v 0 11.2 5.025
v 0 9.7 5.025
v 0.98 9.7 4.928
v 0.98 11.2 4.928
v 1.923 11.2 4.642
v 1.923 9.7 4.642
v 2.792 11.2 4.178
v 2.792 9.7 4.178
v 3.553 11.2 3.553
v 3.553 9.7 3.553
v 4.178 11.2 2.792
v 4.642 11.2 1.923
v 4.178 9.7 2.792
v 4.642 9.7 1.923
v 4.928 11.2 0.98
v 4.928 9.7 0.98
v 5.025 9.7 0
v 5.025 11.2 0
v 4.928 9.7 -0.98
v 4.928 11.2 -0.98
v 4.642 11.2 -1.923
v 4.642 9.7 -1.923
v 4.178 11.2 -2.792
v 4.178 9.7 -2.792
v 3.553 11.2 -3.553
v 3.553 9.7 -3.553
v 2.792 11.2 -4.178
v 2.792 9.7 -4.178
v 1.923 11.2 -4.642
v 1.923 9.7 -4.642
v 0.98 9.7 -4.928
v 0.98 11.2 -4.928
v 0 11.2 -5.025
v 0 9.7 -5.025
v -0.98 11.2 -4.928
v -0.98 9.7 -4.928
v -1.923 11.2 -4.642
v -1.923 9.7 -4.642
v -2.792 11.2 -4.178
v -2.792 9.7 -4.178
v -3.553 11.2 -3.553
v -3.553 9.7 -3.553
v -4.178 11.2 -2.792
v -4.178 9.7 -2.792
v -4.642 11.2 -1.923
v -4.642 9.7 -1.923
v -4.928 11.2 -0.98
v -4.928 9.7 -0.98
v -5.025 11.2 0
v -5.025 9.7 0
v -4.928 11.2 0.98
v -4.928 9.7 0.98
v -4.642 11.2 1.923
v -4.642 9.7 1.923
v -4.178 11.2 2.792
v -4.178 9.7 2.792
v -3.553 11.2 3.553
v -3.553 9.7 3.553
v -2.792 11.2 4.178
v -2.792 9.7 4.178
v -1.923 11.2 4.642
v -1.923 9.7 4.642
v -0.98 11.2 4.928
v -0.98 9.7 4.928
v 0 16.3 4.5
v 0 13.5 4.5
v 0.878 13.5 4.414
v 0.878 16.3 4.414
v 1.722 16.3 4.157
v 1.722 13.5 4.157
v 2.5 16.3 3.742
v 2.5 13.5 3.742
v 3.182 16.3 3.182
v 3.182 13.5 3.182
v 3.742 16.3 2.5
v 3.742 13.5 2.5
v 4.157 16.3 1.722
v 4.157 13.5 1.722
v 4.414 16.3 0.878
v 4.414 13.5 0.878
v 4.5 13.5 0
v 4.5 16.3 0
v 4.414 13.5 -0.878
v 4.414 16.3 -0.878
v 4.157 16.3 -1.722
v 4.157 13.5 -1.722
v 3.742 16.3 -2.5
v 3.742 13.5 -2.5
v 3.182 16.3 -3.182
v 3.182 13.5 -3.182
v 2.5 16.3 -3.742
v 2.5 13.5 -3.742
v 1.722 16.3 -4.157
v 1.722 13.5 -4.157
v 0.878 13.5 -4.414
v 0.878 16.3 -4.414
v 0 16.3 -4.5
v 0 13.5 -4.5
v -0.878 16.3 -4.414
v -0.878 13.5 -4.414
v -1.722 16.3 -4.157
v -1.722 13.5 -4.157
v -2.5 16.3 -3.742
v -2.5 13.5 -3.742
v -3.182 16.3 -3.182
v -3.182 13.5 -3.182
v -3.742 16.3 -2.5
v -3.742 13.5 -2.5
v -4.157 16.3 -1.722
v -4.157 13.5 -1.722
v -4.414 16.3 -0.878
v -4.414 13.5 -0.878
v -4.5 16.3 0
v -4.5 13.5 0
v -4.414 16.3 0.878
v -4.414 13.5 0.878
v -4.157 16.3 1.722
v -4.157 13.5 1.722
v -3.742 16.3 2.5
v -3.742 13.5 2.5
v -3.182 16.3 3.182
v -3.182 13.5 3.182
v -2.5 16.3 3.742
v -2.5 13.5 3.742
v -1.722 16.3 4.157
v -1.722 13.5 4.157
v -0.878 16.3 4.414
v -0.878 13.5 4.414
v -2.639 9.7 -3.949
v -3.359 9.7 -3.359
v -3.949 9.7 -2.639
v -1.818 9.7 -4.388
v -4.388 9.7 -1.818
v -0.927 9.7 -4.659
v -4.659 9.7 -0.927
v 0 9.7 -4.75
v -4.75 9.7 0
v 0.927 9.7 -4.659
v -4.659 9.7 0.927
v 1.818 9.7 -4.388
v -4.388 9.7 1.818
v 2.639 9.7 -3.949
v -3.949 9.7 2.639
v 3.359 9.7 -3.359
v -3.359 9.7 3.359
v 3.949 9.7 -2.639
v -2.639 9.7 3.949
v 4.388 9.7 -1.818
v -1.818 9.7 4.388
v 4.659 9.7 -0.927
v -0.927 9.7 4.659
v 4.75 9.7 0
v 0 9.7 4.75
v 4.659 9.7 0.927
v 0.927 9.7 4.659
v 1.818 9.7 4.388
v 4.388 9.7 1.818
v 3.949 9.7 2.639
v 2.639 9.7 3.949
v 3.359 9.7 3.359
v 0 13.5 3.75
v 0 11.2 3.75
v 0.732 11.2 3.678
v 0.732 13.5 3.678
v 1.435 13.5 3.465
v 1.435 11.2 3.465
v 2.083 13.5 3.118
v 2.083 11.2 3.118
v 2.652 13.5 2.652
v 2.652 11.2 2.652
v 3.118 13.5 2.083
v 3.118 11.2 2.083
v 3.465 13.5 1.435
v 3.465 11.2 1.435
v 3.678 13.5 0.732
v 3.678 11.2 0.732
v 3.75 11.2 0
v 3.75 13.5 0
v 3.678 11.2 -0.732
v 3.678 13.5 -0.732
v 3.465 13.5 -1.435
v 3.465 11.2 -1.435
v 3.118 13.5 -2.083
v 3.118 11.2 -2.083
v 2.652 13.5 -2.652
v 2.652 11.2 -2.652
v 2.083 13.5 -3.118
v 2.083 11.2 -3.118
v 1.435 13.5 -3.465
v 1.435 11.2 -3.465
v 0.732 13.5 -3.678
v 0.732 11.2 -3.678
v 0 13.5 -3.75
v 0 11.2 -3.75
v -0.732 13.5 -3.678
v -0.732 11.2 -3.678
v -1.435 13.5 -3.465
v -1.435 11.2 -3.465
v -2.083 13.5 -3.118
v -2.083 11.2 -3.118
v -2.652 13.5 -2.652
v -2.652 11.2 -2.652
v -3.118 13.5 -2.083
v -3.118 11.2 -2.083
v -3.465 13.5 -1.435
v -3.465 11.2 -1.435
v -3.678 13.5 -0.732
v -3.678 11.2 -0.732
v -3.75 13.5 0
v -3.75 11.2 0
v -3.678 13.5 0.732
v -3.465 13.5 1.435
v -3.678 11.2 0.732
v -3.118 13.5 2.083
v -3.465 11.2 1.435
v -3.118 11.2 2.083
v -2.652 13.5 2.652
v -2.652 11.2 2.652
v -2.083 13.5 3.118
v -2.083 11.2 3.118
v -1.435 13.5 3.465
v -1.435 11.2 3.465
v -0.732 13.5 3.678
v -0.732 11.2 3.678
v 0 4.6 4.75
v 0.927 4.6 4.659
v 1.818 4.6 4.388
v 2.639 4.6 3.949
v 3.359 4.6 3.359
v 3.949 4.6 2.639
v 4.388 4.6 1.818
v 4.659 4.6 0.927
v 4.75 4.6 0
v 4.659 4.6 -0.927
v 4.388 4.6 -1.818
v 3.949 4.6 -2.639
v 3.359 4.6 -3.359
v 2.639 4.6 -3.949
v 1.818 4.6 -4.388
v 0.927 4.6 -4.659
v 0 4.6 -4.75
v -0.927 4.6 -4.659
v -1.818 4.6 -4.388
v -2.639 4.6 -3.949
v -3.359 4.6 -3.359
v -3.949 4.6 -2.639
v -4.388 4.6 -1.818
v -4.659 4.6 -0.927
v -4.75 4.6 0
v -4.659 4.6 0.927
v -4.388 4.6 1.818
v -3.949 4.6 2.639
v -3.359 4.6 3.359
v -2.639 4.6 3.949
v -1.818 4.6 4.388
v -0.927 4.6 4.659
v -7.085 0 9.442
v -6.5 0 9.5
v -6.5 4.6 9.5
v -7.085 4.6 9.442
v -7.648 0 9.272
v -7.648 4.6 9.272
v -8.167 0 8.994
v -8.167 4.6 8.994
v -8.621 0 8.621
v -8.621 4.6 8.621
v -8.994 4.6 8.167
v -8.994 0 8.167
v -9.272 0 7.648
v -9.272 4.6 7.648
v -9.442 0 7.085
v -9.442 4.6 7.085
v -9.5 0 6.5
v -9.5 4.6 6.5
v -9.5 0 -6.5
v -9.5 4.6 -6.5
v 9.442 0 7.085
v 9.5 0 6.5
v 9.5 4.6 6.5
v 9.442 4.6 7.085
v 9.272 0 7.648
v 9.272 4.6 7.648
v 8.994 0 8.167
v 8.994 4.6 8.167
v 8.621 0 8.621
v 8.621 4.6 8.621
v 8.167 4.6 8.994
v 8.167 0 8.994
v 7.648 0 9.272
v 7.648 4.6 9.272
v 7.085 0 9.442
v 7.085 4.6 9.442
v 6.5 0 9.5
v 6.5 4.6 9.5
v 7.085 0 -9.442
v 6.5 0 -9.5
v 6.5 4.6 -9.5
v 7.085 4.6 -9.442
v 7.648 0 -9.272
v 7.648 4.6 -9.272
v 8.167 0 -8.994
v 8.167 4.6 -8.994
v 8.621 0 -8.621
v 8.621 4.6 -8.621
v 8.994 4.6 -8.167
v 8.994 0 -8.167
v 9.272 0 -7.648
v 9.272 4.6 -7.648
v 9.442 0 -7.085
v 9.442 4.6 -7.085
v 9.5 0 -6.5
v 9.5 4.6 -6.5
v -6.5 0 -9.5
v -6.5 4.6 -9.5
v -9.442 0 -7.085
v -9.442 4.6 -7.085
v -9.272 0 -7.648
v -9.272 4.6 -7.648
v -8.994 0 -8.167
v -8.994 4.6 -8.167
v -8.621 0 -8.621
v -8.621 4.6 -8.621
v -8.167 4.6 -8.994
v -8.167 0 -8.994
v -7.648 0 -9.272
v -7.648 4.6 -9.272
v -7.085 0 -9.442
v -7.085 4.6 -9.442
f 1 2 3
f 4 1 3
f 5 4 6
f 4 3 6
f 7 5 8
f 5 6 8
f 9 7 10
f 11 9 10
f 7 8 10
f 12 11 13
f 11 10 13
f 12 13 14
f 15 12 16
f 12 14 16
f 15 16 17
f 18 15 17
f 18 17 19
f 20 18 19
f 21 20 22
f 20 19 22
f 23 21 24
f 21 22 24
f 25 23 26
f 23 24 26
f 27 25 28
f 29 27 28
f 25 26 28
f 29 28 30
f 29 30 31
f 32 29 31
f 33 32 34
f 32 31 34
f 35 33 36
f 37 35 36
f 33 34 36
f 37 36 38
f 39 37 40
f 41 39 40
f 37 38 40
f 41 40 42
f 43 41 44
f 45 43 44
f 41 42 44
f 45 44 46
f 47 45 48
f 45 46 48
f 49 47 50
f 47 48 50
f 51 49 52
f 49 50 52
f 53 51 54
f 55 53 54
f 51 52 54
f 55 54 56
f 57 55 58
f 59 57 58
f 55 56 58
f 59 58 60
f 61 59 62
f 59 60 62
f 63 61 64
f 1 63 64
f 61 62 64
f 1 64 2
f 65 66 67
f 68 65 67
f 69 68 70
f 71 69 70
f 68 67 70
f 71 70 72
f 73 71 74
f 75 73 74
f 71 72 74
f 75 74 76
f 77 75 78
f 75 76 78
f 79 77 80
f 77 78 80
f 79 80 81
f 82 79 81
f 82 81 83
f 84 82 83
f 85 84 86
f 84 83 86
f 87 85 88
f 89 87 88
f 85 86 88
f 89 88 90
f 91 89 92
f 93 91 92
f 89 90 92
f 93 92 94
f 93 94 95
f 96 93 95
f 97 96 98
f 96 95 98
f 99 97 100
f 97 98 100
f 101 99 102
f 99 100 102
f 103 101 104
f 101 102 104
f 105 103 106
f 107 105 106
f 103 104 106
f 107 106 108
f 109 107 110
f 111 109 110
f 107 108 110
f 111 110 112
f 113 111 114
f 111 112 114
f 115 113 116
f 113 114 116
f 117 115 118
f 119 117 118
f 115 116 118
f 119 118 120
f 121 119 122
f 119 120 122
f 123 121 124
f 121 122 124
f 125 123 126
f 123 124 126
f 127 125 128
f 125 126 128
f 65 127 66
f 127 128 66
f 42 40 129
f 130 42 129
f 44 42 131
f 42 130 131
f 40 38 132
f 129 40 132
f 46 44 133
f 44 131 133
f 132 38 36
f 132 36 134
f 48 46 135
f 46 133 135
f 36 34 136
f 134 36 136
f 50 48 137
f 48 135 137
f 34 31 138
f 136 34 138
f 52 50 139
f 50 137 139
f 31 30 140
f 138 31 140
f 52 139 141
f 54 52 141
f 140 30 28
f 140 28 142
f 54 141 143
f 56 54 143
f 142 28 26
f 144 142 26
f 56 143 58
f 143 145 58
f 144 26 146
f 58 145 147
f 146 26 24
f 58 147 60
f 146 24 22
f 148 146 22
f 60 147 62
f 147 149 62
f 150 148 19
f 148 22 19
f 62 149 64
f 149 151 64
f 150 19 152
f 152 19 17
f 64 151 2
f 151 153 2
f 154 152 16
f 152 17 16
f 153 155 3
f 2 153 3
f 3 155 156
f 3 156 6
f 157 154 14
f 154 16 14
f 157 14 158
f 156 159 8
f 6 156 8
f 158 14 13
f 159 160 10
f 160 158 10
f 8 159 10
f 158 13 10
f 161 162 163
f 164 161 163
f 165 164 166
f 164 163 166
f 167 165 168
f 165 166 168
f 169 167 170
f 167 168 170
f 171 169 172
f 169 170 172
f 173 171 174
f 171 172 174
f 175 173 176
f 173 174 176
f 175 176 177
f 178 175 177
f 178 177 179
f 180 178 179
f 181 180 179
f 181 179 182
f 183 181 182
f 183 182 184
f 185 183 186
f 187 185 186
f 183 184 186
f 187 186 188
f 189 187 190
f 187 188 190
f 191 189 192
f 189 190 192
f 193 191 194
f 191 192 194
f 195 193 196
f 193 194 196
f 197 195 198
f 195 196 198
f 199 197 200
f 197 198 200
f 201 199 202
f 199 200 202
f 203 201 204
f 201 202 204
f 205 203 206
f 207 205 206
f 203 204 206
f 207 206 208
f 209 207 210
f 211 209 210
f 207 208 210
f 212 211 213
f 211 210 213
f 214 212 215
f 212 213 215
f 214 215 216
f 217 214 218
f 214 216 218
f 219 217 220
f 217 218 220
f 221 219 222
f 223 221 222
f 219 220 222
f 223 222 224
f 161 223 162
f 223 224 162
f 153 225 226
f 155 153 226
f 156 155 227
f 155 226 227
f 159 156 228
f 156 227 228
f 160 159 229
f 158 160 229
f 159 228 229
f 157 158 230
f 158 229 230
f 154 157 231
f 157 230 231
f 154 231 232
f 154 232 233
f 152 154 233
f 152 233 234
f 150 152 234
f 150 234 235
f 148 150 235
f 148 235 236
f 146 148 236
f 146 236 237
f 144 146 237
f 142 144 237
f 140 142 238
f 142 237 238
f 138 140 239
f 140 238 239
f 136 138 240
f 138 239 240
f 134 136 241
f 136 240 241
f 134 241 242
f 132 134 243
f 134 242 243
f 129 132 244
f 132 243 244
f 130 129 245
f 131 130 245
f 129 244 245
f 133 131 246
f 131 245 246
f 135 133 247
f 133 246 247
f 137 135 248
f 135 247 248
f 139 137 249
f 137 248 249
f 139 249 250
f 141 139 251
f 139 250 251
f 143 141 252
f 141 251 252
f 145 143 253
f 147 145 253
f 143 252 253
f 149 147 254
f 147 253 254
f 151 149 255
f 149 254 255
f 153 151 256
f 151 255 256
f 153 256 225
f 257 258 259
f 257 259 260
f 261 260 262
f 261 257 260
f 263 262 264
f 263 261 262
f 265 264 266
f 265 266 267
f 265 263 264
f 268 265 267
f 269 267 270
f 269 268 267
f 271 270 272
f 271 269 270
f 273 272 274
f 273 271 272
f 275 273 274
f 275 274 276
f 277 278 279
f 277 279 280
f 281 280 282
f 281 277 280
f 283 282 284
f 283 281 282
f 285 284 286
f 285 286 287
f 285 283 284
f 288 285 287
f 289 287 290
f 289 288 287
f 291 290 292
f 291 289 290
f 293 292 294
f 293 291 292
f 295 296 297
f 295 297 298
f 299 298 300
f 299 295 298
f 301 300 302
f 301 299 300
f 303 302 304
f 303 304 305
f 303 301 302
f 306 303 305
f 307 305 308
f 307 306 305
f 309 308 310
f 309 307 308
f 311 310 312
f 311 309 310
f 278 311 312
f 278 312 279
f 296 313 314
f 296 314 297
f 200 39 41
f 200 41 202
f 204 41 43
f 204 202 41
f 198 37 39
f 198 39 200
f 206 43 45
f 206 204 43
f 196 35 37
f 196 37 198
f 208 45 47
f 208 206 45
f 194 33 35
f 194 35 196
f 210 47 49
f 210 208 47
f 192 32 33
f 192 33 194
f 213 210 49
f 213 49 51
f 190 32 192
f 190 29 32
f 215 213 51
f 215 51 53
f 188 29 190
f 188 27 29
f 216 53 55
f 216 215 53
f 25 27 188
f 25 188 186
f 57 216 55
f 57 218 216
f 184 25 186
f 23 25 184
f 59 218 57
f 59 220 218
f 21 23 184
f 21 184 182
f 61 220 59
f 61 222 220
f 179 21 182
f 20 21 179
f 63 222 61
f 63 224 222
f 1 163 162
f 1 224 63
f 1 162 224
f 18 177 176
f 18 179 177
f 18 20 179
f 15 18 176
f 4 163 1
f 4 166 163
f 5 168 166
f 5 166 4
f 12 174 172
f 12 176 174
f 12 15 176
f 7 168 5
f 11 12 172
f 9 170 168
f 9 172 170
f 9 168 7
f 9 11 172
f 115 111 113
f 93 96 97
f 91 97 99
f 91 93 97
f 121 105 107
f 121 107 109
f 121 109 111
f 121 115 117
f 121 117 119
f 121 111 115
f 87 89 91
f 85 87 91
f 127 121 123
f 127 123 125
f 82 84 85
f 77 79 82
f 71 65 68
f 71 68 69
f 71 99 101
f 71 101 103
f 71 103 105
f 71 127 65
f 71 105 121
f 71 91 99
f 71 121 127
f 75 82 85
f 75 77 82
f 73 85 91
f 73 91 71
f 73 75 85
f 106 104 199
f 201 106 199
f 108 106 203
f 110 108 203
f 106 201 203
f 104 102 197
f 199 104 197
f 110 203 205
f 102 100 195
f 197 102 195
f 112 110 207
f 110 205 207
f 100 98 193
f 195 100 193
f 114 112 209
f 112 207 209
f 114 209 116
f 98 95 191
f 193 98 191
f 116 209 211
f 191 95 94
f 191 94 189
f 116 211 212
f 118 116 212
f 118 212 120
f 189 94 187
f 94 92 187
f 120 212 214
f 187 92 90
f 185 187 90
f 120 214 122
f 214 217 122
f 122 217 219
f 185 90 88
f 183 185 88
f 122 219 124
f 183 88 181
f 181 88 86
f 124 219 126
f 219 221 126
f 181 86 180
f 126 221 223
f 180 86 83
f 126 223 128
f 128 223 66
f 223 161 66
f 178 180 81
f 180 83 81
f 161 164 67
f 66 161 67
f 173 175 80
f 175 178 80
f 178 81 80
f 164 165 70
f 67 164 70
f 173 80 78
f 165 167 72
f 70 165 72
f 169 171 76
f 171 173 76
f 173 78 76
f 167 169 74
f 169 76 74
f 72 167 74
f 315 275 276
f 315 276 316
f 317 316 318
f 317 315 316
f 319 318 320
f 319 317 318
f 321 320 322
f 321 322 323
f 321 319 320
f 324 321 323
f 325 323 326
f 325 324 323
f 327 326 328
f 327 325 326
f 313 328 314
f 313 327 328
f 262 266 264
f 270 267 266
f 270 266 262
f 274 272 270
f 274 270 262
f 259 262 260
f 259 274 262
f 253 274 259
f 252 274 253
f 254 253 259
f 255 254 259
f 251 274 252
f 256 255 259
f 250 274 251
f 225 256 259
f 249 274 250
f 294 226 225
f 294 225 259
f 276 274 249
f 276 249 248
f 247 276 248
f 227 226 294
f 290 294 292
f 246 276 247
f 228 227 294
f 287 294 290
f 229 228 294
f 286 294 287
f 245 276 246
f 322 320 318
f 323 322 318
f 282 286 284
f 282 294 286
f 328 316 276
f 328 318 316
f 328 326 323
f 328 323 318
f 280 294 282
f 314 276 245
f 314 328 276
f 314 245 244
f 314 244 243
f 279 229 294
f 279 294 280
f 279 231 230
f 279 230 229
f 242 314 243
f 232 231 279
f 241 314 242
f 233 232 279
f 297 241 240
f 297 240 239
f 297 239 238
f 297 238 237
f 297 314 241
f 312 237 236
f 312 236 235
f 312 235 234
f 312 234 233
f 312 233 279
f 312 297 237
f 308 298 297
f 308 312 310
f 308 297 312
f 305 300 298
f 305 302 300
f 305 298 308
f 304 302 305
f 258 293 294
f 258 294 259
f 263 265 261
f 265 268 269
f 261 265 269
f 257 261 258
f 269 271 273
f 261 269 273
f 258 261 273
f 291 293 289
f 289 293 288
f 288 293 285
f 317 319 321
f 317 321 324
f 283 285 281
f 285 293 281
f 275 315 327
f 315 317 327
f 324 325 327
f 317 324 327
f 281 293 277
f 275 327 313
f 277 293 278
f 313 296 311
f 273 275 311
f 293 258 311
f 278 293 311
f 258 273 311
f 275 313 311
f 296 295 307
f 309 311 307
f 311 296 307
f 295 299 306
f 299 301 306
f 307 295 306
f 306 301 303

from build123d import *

# Parameters (mm, degrees)
SALIENTE_EXTRUIR2_DEPTH      = 4.6
SALIENTE_EXTRUIR3_DEPTH      = 5.1
SALIENTE_EXTRUIR3_DEPTH_BACK = 4.6
CROQUIS2_R                   = 4.75
CROQUIS4_R                   = 5.025
SALIENTE_EXTRUIR4_DEPTH      = 1.5
CROQUIS6_R                   = 3.75
SALIENTE_EXTRUIR5_DEPTH      = 2.3
CROQUIS7_R                   = 4.5
SALIENTE_EXTRUIR6_DEPTH      = 2.8


with BuildPart() as part:
    # Croquis1 → Saliente-Extruir2 (new body)
    # profile 1 of 5: a face of its own
    with BuildSketch(Plane(origin=(0, 0, 0), x_dir=(1, 0, 0), z_dir=(0, 1, 0))):
        with BuildLine():
            ThreePointArc((6.5, 9.5), (8.621320344, 8.621320344), (9.5, 6.5))
            Line((9.5, 6.5), (9.5, -6.5))
            ThreePointArc((9.5, -6.5), (8.621320344, -8.621320344), (6.5, -9.5))
            Line((6.5, -9.5), (-6.5, -9.5))
            ThreePointArc((-6.5, -9.5), (-8.621320344, -8.621320344), (-9.5, -6.5))
            Line((-9.5, -6.5), (-9.5, 6.5))
            ThreePointArc((-9.5, 6.5), (-8.621320344, 8.621320344), (-6.5, 9.5))
            Line((-6.5, 9.5), (6.5, 9.5))
        make_face()
        with BuildLine():
            ThreePointArc((4.25, -4.75), (4.603553391, -4.603553391), (4.75, -4.25))
            Line((4.75, -4.25), (4.75, 4.25))
            ThreePointArc((4.75, 4.25), (4.603553391, 4.603553391), (4.25, 4.75))
            Line((4.25, 4.75), (-4.25, 4.75))
            ThreePointArc((-4.25, 4.75), (-4.603553391, 4.603553391), (-4.75, 4.25))
            Line((-4.75, 4.25), (-4.75, -4.25))
            ThreePointArc((-4.75, -4.25), (-4.603553391, -4.603553391), (-4.25, -4.75))
            Line((-4.25, -4.75), (4.25, -4.75))
        make_face(mode=Mode.SUBTRACT)
    # profile 2 of 5: a face of its own
    with BuildSketch(Plane(origin=(0, 0, 0), x_dir=(1, 0, 0), z_dir=(0, 1, 0))):
        with BuildLine():
            ThreePointArc((0, -4.75), (-3.358757211, -3.358757211), (-4.75, 0))
            Line((-4.75, 0), (-4.75, -4.25))
            ThreePointArc((-4.75, -4.25), (-4.603553391, -4.603553391), (-4.25, -4.75))
            Line((-4.25, -4.75), (0, -4.75))
        make_face()
    # profile 3 of 5: a face of its own
    with BuildSketch(Plane(origin=(0, 0, 0), x_dir=(1, 0, 0), z_dir=(0, 1, 0))):
        with BuildLine():
            Line((4.75, -4.25), (4.75, 0))
            ThreePointArc((4.75, 0), (3.358757211, -3.358757211), (0, -4.75))
            Line((0, -4.75), (4.25, -4.75))
            ThreePointArc((4.25, -4.75), (4.603553391, -4.603553391), (4.75, -4.25))
        make_face()
    # profile 4 of 5: a face of its own
    with BuildSketch(Plane(origin=(0, 0, 0), x_dir=(1, 0, 0), z_dir=(0, 1, 0))):
        with BuildLine():
            Line((4.25, 4.75), (0, 4.75))
            ThreePointArc((0, 4.75), (3.358757211, 3.358757211), (4.75, 0))
            Line((4.75, 0), (4.75, 4.25))
            ThreePointArc((4.75, 4.25), (4.603553391, 4.603553391), (4.25, 4.75))
        make_face()
    # profile 5 of 5: a face of its own
    with BuildSketch(Plane(origin=(0, 0, 0), x_dir=(1, 0, 0), z_dir=(0, 1, 0))):
        with BuildLine():
            Line((0, 4.75), (-4.25, 4.75))
            ThreePointArc((-4.25, 4.75), (-4.603553391, 4.603553391), (-4.75, 4.25))
            Line((-4.75, 4.25), (-4.75, 0))
            ThreePointArc((-4.75, 0), (-3.358757211, 3.358757211), (0, 4.75))
        make_face()
    extrude(amount=SALIENTE_EXTRUIR2_DEPTH)

    # Croquis2 → Saliente-Extruir3 (add, two sides: drawn at the far end of the back side and taken through both)
    with BuildSketch(Plane(origin=(0, 4.6, 0), x_dir=(1, 0, 0), z_dir=(0, 1, 0)).offset(-SALIENTE_EXTRUIR3_DEPTH_BACK)):
        with Locations(Location((0, 0, 0), (0, 0, 270))):
            Circle(CROQUIS2_R)
    extrude(amount=SALIENTE_EXTRUIR3_DEPTH + SALIENTE_EXTRUIR3_DEPTH_BACK)

    # Croquis4 → Saliente-Extruir4 (add)
    with BuildSketch(Plane(origin=(0, 9.7, 0), x_dir=(1, 0, 0), z_dir=(0, 1, 0))):
        with Locations(Location((0, 0, 0), (0, 0, 270))):
            Circle(CROQUIS4_R)
    extrude(amount=SALIENTE_EXTRUIR4_DEPTH)

    # Croquis6 → Saliente-Extruir5 (add)
    with BuildSketch(Plane(origin=(0, 11.2, 0), x_dir=(1, 0, 0), z_dir=(0, 1, 0))):
        with Locations(Location((0, 0, 0), (0, 0, 270))):
            Circle(CROQUIS6_R)
    extrude(amount=SALIENTE_EXTRUIR5_DEPTH)

    # Croquis7 → Saliente-Extruir6 (add)
    with BuildSketch(Plane(origin=(0, 13.5, 0), x_dir=(1, 0, 0), z_dir=(0, 1, 0))):
        with Locations(Location((0, 0, 0), (0, 0, 270))):
            Circle(CROQUIS7_R)
    extrude(amount=SALIENTE_EXTRUIR6_DEPTH)


solid = part.part
